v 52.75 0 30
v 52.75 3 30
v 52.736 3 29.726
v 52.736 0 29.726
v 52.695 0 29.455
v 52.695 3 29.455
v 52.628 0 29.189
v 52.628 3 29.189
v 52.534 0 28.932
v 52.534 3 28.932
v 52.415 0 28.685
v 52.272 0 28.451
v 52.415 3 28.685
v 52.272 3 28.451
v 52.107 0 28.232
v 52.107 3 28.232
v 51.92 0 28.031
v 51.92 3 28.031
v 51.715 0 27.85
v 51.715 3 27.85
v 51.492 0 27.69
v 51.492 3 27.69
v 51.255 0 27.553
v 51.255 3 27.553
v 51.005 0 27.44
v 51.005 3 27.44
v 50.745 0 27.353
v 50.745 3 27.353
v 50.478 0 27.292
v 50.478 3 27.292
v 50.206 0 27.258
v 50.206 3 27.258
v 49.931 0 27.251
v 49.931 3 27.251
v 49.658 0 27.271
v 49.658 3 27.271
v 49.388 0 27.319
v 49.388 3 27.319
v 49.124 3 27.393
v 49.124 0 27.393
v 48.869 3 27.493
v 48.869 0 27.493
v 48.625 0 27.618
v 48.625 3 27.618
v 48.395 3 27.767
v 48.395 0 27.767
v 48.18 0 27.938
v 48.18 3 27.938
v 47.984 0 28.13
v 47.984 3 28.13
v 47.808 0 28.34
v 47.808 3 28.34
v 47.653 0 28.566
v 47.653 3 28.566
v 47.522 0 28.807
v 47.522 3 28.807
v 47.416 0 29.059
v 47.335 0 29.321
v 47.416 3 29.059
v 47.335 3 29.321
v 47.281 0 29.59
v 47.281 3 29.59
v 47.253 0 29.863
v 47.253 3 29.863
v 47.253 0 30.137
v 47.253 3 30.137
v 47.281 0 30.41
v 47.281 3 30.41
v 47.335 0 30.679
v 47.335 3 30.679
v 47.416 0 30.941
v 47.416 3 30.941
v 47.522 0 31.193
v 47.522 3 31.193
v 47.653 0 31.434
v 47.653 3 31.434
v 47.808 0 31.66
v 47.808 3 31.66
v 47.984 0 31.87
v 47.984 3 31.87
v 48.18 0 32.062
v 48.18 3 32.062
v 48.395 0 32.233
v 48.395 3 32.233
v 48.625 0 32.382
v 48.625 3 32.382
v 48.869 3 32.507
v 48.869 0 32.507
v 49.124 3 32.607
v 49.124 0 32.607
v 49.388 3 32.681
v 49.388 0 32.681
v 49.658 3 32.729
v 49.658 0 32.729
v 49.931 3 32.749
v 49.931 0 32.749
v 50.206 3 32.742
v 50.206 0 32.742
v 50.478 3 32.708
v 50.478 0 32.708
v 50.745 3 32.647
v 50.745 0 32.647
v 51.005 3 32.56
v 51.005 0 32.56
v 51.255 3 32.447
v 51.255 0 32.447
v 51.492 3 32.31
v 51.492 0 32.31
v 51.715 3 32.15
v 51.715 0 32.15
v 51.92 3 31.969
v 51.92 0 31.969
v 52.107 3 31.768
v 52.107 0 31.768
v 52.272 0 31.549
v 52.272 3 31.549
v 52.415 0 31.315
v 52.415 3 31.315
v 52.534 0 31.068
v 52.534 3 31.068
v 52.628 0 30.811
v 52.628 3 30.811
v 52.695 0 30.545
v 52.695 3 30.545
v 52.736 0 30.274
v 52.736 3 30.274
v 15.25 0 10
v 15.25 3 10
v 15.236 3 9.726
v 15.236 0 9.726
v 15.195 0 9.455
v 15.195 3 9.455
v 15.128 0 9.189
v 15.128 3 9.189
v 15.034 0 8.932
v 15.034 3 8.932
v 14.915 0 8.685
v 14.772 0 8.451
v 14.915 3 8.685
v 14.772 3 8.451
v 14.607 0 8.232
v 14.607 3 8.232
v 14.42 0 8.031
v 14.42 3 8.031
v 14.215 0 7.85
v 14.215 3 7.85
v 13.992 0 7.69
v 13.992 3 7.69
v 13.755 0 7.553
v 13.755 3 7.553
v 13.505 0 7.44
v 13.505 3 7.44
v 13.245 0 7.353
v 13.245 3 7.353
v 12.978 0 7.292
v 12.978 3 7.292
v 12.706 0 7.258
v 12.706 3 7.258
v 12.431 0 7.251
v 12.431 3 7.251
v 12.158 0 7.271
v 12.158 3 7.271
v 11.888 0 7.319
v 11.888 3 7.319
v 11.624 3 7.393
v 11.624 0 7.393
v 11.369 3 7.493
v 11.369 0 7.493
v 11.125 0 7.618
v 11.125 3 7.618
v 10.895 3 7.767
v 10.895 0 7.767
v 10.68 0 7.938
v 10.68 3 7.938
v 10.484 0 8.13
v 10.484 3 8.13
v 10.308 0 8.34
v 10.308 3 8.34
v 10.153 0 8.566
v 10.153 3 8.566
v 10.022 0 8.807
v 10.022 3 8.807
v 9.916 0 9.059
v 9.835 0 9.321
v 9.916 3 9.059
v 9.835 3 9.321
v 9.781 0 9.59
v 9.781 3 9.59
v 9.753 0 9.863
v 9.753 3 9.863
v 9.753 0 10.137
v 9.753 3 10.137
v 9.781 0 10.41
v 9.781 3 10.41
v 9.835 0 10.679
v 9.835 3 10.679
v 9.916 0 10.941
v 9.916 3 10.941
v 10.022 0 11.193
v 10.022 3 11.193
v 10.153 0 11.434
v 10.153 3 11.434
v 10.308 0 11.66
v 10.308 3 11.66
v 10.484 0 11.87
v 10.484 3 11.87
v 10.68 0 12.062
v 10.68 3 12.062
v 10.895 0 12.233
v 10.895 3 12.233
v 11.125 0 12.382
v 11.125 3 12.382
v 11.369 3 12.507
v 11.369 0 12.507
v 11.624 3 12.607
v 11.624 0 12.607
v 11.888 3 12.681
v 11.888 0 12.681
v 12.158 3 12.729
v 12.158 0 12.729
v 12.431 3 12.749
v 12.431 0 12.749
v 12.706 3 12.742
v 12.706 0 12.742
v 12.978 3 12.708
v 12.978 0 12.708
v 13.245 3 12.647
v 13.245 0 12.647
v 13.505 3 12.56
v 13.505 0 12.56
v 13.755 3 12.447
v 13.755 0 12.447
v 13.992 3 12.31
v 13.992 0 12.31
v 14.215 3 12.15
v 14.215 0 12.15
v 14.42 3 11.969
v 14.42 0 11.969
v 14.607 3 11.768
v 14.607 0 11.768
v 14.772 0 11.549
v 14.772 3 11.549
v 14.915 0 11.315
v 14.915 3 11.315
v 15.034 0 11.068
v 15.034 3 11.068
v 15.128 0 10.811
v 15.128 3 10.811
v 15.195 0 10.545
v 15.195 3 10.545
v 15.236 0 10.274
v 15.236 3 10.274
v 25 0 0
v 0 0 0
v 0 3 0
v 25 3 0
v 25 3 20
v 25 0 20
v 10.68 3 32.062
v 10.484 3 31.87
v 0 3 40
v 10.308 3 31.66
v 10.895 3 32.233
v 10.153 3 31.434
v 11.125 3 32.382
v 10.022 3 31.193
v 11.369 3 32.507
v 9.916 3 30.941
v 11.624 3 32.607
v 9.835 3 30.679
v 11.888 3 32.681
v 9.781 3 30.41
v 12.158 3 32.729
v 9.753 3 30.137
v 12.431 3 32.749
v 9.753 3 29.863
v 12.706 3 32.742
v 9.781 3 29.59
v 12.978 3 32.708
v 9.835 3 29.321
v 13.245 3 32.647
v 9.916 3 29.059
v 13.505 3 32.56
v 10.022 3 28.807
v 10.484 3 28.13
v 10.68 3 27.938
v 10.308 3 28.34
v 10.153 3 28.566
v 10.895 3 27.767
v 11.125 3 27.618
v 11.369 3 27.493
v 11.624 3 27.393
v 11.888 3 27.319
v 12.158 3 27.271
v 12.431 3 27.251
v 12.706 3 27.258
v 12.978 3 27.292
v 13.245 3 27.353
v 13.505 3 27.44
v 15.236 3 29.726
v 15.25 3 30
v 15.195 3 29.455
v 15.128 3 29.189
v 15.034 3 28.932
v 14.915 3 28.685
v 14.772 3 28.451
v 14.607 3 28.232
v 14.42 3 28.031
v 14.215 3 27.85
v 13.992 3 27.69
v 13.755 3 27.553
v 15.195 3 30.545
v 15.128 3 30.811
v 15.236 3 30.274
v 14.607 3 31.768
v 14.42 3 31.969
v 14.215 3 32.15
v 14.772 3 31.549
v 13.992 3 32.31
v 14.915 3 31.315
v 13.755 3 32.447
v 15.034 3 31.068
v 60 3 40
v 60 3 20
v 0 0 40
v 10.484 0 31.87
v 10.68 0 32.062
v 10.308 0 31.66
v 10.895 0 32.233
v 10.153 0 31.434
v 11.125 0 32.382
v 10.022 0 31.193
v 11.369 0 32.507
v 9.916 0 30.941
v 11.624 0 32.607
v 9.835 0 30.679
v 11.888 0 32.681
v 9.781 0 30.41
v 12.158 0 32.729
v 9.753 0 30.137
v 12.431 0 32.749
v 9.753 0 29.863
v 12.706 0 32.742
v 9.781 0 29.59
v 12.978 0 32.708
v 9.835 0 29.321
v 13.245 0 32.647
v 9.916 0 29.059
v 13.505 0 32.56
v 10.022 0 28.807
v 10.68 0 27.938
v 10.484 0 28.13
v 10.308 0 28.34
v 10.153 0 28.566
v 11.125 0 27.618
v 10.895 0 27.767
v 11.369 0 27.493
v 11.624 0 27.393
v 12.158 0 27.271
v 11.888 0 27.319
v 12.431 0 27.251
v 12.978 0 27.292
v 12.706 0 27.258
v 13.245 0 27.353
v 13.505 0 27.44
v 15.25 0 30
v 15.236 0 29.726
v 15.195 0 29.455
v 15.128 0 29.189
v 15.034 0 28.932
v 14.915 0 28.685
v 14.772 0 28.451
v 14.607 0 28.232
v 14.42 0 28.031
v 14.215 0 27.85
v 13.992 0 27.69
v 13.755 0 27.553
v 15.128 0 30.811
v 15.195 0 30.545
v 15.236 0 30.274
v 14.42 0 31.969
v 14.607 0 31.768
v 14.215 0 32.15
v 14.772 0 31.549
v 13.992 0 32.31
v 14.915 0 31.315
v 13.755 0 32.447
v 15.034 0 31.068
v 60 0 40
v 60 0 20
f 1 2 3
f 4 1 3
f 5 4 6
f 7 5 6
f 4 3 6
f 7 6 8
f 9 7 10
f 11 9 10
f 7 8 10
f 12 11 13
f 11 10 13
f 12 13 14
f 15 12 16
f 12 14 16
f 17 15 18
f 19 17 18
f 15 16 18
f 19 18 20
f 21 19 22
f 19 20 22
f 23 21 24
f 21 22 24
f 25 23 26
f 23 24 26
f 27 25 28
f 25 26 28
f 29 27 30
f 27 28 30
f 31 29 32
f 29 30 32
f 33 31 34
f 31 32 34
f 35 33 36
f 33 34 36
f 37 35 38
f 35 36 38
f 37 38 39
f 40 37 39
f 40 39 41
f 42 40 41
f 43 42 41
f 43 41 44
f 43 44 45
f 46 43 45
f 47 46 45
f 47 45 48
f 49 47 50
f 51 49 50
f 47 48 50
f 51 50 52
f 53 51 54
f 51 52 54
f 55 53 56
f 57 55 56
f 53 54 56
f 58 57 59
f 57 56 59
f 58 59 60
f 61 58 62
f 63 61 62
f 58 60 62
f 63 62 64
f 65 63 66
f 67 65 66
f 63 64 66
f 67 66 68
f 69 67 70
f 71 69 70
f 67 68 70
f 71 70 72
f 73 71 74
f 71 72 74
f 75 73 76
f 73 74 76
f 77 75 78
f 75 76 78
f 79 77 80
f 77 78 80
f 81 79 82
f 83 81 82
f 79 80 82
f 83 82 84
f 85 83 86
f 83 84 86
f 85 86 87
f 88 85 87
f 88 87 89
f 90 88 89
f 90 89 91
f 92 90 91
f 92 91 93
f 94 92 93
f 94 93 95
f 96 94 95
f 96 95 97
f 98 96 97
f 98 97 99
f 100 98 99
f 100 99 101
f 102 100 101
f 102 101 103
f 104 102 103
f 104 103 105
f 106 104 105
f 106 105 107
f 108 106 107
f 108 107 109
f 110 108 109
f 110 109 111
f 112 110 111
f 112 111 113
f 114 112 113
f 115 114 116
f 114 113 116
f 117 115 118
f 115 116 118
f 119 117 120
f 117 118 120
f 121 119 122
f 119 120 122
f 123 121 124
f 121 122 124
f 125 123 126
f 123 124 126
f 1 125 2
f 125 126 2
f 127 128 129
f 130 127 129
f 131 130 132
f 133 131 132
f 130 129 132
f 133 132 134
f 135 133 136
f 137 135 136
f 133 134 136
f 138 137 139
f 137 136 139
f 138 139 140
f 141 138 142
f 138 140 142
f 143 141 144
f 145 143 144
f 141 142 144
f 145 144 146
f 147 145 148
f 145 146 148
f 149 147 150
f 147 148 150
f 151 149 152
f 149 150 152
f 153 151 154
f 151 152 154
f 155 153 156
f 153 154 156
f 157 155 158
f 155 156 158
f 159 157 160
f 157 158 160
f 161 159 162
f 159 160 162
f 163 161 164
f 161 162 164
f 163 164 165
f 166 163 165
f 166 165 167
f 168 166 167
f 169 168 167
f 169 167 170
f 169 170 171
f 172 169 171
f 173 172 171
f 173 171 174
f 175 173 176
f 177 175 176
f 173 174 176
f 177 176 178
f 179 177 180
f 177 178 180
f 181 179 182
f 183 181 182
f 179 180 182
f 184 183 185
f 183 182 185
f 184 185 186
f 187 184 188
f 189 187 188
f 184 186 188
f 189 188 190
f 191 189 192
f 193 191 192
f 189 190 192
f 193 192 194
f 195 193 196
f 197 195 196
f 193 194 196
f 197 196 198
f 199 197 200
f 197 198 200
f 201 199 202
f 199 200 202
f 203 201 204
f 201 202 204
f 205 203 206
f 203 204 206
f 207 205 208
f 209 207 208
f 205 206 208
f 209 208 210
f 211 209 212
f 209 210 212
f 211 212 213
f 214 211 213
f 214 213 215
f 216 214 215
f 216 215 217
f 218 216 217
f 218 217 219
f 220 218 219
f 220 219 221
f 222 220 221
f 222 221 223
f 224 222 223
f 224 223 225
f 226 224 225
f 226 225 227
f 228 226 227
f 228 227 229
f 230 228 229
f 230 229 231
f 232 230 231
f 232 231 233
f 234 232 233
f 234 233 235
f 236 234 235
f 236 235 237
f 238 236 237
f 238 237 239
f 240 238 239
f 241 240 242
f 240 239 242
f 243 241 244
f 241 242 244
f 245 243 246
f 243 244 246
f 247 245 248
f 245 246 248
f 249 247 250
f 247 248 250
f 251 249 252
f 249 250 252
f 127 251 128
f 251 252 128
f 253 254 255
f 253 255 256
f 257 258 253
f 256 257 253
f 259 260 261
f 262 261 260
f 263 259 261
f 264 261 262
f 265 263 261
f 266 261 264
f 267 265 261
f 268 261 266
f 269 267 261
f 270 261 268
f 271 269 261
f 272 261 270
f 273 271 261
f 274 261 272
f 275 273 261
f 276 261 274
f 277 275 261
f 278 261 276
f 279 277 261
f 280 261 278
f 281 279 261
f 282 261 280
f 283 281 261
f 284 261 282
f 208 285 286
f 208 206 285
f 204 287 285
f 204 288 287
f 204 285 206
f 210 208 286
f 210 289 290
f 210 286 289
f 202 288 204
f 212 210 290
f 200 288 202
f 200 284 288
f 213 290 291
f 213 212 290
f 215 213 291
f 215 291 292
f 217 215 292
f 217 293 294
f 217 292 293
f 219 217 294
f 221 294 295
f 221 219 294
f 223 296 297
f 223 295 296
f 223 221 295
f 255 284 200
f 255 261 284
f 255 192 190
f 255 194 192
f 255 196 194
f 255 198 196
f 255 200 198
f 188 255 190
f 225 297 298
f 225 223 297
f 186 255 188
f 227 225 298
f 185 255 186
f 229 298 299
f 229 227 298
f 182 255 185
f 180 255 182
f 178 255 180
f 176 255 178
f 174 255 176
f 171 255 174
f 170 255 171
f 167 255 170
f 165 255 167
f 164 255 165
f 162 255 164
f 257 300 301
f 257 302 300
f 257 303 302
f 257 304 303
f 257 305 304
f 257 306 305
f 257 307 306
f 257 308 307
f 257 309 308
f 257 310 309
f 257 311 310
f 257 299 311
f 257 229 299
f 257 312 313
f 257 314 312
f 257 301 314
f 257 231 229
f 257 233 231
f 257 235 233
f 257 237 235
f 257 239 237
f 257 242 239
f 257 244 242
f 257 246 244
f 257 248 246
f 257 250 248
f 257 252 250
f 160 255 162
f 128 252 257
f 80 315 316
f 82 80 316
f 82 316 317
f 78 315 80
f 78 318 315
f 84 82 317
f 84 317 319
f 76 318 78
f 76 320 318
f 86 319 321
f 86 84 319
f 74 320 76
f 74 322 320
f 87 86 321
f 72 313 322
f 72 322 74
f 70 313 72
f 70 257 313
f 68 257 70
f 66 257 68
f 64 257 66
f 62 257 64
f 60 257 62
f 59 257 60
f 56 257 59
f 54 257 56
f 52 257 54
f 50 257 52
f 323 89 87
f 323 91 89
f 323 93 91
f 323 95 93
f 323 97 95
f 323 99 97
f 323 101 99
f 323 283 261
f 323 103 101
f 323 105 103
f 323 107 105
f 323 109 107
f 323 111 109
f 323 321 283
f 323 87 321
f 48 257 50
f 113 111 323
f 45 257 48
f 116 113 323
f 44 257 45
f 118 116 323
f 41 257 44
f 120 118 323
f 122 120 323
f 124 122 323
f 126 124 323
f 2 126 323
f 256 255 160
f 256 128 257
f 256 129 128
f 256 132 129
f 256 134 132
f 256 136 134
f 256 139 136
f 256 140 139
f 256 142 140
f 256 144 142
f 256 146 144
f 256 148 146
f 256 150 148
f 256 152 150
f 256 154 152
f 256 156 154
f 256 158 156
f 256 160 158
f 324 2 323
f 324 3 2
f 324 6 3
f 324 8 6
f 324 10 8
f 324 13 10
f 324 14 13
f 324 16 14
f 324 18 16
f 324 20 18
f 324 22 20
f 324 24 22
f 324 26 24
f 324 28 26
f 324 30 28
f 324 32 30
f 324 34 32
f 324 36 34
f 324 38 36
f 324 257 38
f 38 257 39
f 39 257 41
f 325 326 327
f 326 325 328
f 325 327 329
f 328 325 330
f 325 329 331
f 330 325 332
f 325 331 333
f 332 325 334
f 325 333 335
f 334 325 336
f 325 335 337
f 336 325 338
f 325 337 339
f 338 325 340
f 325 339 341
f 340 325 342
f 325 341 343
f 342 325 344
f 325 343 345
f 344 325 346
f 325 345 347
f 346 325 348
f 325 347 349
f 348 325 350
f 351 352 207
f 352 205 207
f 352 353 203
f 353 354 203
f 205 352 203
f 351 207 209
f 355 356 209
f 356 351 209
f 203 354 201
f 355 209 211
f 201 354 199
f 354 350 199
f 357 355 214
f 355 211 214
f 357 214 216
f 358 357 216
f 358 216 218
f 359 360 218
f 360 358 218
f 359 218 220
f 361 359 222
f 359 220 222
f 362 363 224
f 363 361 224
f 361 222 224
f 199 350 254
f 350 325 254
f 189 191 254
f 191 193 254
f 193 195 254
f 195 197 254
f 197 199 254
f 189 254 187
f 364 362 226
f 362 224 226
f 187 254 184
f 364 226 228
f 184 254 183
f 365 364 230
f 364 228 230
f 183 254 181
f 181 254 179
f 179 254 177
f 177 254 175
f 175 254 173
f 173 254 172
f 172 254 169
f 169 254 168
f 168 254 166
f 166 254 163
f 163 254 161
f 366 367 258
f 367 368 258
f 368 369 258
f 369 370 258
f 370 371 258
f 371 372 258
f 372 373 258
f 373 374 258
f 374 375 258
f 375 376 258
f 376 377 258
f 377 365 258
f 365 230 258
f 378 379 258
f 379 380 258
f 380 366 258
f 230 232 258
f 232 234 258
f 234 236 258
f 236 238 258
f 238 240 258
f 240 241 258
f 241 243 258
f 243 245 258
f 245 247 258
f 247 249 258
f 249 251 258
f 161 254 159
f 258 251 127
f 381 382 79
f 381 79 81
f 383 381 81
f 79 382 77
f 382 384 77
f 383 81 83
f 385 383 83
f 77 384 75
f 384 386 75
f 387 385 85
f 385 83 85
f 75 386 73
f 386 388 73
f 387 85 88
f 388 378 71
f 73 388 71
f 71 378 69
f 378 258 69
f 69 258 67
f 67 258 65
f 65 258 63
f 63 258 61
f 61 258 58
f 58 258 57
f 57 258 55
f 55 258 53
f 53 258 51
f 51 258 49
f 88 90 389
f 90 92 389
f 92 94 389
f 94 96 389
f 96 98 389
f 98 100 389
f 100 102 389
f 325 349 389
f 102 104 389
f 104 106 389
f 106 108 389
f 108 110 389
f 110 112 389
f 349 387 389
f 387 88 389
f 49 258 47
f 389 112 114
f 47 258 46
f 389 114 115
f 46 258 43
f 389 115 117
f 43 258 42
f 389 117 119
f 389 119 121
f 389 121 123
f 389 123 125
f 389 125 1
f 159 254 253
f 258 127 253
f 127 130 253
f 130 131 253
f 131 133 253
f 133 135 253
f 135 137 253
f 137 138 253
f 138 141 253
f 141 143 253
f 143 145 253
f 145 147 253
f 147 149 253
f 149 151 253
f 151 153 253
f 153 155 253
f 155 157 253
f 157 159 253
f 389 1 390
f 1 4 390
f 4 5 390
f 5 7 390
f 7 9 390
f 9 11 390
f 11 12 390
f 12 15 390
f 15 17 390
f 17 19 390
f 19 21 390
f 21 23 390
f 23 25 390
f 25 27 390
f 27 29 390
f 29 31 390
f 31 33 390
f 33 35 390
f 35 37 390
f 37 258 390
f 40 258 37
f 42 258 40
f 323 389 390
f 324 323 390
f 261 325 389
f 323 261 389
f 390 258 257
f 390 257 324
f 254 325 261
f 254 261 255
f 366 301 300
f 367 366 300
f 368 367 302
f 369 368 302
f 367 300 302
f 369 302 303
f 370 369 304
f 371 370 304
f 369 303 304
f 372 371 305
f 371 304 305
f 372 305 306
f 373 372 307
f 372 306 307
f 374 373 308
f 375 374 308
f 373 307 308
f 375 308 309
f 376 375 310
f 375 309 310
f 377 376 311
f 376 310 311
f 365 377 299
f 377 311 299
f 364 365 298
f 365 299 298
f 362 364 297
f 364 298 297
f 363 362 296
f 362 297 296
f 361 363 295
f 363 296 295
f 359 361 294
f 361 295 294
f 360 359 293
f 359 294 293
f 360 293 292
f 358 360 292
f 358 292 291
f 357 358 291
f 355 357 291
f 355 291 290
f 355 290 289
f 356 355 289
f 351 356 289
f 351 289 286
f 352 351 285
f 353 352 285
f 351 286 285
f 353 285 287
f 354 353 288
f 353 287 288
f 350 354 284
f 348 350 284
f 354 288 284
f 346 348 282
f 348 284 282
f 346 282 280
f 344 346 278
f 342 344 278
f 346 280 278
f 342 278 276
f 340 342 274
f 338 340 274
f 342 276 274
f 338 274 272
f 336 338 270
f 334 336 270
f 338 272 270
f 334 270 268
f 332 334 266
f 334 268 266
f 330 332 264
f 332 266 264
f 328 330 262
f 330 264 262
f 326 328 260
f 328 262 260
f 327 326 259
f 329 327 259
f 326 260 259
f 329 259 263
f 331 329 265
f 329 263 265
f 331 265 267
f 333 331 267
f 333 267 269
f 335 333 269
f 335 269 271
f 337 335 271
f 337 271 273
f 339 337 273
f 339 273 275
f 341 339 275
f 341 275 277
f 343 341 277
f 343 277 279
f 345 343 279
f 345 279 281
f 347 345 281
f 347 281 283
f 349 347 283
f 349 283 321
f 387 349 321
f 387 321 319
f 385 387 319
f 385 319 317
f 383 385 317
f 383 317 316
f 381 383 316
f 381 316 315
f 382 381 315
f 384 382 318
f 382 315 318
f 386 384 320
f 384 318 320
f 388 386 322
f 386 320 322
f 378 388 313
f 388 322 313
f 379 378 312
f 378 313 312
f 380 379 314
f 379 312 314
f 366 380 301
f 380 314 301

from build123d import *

# Parameters (mm, degrees)
SKETCH1_W           = 25
SKETCH1_H           = 40
SKETCH1_W_2         = 35
SKETCH1_H_2         = 20
BOSS_EXTRUDE1_DEPTH = 3
SKETCH4_R           = 2.75
CUT_EXTRUDE1_DEPTH  = 3


with BuildPart() as part:
    # Sketch1 → Boss-Extrude1 (new body)
    with BuildSketch(Plane(origin=(0, 0, 0), x_dir=(1, 0, 0), z_dir=(0, 1, 0))):
        with Locations((12.5, -20)):
            Rectangle(SKETCH1_W, SKETCH1_H)
        with Locations((42.5, -30)):
            Rectangle(SKETCH1_W_2, SKETCH1_H_2)
    extrude(amount=BOSS_EXTRUDE1_DEPTH)

    # Sketch4 → Cut-Extrude1 (cut)
    with BuildSketch(Plane(origin=(0, 3, 0), x_dir=(1, 0, 0), z_dir=(0, 1, 0))):
        with Locations((12.5, -10)):
            Circle(SKETCH4_R)
        with Locations((12.5, -30)):
            Circle(SKETCH4_R)
        with Locations((50, -30)):
            Circle(SKETCH4_R)
    extrude(amount=-CUT_EXTRUDE1_DEPTH, mode=Mode.SUBTRACT)


solid = part.part
